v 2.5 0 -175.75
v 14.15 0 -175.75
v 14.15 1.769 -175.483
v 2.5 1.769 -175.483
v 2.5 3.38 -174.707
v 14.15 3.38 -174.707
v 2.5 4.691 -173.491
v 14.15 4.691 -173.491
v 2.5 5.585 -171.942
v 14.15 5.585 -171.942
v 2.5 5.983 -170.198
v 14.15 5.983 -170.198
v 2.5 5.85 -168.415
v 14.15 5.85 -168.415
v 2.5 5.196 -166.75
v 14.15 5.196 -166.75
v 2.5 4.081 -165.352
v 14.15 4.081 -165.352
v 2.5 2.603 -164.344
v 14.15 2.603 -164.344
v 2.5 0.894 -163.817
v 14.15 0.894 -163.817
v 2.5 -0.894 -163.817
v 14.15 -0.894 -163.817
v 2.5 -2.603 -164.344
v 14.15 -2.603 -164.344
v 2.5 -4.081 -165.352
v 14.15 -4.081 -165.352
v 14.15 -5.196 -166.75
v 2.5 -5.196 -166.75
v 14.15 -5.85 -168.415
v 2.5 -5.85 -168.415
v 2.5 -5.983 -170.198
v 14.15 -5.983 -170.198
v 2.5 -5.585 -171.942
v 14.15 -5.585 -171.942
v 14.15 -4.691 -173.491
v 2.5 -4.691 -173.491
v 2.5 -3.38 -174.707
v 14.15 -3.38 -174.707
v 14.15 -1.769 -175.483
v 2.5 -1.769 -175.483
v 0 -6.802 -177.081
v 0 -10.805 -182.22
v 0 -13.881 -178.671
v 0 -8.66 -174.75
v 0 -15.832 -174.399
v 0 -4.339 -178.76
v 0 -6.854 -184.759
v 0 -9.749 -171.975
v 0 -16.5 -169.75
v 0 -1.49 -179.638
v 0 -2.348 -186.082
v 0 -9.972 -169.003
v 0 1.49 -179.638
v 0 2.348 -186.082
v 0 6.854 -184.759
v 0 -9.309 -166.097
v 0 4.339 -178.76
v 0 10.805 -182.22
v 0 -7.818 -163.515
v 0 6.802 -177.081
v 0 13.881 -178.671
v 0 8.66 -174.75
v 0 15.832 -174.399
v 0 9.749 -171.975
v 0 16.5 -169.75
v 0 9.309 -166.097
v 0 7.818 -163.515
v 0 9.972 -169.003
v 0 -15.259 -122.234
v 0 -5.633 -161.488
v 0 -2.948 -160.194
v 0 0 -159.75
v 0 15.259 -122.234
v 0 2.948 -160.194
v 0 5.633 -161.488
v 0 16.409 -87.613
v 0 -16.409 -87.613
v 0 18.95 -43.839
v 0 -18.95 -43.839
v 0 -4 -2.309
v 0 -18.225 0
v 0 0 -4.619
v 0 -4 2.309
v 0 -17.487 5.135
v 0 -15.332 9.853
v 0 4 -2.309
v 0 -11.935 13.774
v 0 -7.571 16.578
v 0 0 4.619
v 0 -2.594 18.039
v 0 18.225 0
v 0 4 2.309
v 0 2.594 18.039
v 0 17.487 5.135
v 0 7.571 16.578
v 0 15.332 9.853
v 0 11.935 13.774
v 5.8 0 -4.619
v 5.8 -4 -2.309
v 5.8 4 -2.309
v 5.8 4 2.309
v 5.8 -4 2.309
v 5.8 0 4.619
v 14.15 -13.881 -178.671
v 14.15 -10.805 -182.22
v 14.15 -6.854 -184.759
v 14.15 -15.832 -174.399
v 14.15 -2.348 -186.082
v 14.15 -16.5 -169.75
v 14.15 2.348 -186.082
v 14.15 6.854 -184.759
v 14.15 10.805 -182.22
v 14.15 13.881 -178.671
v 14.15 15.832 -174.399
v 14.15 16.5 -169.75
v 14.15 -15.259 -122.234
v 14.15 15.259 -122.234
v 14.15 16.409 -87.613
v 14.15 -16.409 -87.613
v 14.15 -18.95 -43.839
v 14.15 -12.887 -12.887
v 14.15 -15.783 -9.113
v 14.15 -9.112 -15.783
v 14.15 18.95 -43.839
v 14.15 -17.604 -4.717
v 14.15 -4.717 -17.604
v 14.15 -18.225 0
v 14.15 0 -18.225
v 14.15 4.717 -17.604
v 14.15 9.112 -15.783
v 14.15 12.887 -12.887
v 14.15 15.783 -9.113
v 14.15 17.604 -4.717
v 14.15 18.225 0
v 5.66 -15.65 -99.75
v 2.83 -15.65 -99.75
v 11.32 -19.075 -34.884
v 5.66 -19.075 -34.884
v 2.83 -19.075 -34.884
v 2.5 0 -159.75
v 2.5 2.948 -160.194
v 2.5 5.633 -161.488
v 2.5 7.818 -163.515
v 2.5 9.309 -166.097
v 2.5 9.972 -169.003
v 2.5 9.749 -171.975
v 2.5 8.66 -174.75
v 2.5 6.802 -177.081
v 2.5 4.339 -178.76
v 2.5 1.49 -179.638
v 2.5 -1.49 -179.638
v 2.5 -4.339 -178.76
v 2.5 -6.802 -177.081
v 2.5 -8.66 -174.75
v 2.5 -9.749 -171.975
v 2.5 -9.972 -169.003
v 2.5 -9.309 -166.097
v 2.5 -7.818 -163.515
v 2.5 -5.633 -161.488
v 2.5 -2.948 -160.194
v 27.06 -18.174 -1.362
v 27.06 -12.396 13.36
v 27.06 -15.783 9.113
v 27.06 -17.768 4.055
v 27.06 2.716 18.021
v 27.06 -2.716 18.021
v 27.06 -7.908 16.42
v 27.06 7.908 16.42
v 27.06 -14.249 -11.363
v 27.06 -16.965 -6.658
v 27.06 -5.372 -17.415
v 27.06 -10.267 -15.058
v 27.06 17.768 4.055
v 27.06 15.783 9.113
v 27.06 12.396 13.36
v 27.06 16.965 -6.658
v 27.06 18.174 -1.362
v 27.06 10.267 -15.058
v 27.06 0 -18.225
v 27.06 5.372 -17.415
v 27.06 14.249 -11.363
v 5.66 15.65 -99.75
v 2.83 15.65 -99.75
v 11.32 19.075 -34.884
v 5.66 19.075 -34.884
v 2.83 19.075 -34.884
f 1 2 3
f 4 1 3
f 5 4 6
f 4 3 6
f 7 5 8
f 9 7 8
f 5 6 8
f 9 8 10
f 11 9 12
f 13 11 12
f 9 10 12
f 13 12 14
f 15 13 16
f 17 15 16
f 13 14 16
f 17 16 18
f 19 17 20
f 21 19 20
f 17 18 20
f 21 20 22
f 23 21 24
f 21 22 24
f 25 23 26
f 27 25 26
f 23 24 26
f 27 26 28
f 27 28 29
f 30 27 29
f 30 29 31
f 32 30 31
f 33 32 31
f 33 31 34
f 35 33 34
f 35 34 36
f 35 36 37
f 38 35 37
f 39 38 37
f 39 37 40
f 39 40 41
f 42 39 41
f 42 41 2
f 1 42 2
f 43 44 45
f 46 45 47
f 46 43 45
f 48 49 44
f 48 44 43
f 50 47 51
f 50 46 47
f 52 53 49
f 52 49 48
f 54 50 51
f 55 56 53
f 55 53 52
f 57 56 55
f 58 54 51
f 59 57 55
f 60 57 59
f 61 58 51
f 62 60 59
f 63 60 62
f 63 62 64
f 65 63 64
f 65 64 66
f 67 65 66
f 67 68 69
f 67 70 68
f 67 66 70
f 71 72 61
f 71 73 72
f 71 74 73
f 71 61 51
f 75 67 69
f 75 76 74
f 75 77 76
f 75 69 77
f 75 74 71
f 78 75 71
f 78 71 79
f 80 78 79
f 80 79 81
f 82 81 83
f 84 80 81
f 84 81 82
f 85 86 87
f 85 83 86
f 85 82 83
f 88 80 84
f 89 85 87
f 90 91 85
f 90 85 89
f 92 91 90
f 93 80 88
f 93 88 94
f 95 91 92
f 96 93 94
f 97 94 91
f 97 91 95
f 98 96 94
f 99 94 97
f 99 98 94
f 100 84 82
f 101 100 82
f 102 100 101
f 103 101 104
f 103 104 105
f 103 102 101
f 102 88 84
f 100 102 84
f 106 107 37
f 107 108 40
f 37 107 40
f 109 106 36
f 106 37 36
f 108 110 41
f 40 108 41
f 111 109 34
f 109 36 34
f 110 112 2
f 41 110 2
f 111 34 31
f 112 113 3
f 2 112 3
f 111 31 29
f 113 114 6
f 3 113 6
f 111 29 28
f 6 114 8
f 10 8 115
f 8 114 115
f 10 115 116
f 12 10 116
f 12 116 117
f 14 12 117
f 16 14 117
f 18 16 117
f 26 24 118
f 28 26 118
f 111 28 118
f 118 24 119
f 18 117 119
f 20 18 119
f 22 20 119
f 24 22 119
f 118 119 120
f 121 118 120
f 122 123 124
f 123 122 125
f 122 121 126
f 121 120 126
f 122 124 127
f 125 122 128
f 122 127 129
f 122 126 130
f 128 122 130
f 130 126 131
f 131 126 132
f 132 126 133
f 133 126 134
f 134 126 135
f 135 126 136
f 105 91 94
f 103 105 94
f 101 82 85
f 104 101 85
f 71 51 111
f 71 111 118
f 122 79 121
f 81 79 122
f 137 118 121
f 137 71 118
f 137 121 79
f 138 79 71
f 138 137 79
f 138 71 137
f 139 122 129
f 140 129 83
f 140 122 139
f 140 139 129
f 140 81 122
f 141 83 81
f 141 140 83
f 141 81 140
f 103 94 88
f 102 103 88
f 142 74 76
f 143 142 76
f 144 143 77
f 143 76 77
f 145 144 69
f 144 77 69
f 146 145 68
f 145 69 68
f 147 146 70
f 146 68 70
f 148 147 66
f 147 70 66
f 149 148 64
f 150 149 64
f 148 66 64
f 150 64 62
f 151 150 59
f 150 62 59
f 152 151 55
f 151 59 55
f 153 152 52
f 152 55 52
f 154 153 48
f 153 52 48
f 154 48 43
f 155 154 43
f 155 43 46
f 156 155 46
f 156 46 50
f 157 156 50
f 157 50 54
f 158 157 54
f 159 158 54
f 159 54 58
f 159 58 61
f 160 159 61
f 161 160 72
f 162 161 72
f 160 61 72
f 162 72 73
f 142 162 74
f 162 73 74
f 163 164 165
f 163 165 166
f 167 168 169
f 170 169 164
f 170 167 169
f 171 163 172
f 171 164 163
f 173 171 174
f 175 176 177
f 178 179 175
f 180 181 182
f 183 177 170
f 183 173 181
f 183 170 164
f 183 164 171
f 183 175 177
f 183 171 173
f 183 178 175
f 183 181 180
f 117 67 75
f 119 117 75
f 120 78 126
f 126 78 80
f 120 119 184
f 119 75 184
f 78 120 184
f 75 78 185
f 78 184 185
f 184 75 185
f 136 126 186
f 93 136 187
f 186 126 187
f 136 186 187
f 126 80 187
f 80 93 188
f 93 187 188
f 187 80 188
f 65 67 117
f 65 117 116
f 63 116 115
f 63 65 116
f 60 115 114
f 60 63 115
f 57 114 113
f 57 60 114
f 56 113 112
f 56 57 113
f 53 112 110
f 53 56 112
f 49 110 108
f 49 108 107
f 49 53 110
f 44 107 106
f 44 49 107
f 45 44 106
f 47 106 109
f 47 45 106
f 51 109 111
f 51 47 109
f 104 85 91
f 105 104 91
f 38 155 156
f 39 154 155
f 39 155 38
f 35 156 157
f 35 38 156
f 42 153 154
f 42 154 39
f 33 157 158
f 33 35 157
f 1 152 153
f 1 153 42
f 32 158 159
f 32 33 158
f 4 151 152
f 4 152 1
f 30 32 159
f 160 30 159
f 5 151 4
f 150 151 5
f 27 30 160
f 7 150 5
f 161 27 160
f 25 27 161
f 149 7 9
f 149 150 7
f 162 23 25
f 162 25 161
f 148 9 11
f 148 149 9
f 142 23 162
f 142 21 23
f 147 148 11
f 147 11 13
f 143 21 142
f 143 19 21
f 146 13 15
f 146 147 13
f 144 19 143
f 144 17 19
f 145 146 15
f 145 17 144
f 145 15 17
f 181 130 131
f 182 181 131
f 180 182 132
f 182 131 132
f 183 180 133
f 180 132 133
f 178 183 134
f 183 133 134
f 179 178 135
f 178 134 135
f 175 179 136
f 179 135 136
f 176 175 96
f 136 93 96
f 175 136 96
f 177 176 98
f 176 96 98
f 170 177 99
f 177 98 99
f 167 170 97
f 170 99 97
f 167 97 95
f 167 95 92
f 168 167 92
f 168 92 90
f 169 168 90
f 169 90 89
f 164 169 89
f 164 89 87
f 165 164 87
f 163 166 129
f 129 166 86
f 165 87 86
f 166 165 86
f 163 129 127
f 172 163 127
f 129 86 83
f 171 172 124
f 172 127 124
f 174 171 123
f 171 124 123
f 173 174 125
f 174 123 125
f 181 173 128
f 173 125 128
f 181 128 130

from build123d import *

# Parameters (mm, degrees)
SKETCH1_R                    = 18.225
BOSS_EXTRUDE1_DEPTH          = 27.06
CUT_EXTRUDE1_DEPTH           = 5.8
BOSS_EXTRUDE2_DEPTH          = 14.15
TAP_DRILL_FOR_M14X2_0_TAP1_D = 12
SKETCH8_R                    = 10
CUT_EXTRUDE2_DEPTH           = 2.5


with BuildPart() as part:
    # Sketch1 → Boss-Extrude1 (new body)
    with BuildSketch(Plane(origin=(0, 0, 0), x_dir=(0, 0, -1), z_dir=(1, 0, 0))):
        Circle(SKETCH1_R)
    extrude(amount=BOSS_EXTRUDE1_DEPTH)

    # Sketch2 → Cut-Extrude1 (cut)
    with BuildSketch(Plane.ZY):
        Polygon((4.618802154, 0), (2.309401077, 4), (-2.309401077, 4), (-4.618802154, 0), (-2.309401077, -4), (2.309401077, -4), align=None)
    extrude(amount=-CUT_EXTRUDE1_DEPTH, mode=Mode.SUBTRACT)

    # Sketch3 → Boss-Extrude2 (add)
    with BuildSketch(Plane.ZY):
        with BuildLine():
            ThreePointArc((-169.749999999, 16.5), (-186.25, 1e-09), (-169.75, -16.5))
            add(Edge.make_bspline(
                [(-169.75, -16.5), (-159.749007012, -16.27034763), (-146.423041336, -15.435466348), (-123.084465671, -15.240795583), (-99.700937004, -15.146825519), (-56.582760429, -19.333044357), (-23.234269391, -19.487462019), (0, -18.225)],
                knots=[0, 0, 0, 0, 0.176707611, 0.235576803, 0.412182603, 0.589218848, 1, 1, 1, 1], degree=3))
            ThreePointArc((0, -18.225), (-18.225, -1e-09), (-1e-09, 18.225))
            add(Edge.make_bspline(
                [(-169.749999999, 16.5), (-159.749007011, 16.27034763), (-146.423041336, 15.435466348), (-123.084465671, 15.240795583), (-99.700937004, 15.146825519), (-56.582760429, 19.333044357), (-23.234269392, 19.487462019), (-1e-09, 18.225)],
                knots=[0, 0, 0, 0, 0.176707611, 0.235576803, 0.412182603, 0.589218848, 1, 1, 1, 1], degree=3))
        make_face()
    extrude(amount=-BOSS_EXTRUDE2_DEPTH)

    # Tap Drill for M14x2.0 Tap1 (through all)
    with Locations(Plane.ZY):
        with Locations((-169.75, 0)):
            Hole(TAP_DRILL_FOR_M14X2_0_TAP1_D / 2)

    # Sketch8 → Cut-Extrude2 (cut)
    with BuildSketch(Plane.ZY):
        with Locations((-169.75, 0)):
            Circle(SKETCH8_R)
    extrude(amount=-CUT_EXTRUDE2_DEPTH, mode=Mode.SUBTRACT)


solid = part.part
